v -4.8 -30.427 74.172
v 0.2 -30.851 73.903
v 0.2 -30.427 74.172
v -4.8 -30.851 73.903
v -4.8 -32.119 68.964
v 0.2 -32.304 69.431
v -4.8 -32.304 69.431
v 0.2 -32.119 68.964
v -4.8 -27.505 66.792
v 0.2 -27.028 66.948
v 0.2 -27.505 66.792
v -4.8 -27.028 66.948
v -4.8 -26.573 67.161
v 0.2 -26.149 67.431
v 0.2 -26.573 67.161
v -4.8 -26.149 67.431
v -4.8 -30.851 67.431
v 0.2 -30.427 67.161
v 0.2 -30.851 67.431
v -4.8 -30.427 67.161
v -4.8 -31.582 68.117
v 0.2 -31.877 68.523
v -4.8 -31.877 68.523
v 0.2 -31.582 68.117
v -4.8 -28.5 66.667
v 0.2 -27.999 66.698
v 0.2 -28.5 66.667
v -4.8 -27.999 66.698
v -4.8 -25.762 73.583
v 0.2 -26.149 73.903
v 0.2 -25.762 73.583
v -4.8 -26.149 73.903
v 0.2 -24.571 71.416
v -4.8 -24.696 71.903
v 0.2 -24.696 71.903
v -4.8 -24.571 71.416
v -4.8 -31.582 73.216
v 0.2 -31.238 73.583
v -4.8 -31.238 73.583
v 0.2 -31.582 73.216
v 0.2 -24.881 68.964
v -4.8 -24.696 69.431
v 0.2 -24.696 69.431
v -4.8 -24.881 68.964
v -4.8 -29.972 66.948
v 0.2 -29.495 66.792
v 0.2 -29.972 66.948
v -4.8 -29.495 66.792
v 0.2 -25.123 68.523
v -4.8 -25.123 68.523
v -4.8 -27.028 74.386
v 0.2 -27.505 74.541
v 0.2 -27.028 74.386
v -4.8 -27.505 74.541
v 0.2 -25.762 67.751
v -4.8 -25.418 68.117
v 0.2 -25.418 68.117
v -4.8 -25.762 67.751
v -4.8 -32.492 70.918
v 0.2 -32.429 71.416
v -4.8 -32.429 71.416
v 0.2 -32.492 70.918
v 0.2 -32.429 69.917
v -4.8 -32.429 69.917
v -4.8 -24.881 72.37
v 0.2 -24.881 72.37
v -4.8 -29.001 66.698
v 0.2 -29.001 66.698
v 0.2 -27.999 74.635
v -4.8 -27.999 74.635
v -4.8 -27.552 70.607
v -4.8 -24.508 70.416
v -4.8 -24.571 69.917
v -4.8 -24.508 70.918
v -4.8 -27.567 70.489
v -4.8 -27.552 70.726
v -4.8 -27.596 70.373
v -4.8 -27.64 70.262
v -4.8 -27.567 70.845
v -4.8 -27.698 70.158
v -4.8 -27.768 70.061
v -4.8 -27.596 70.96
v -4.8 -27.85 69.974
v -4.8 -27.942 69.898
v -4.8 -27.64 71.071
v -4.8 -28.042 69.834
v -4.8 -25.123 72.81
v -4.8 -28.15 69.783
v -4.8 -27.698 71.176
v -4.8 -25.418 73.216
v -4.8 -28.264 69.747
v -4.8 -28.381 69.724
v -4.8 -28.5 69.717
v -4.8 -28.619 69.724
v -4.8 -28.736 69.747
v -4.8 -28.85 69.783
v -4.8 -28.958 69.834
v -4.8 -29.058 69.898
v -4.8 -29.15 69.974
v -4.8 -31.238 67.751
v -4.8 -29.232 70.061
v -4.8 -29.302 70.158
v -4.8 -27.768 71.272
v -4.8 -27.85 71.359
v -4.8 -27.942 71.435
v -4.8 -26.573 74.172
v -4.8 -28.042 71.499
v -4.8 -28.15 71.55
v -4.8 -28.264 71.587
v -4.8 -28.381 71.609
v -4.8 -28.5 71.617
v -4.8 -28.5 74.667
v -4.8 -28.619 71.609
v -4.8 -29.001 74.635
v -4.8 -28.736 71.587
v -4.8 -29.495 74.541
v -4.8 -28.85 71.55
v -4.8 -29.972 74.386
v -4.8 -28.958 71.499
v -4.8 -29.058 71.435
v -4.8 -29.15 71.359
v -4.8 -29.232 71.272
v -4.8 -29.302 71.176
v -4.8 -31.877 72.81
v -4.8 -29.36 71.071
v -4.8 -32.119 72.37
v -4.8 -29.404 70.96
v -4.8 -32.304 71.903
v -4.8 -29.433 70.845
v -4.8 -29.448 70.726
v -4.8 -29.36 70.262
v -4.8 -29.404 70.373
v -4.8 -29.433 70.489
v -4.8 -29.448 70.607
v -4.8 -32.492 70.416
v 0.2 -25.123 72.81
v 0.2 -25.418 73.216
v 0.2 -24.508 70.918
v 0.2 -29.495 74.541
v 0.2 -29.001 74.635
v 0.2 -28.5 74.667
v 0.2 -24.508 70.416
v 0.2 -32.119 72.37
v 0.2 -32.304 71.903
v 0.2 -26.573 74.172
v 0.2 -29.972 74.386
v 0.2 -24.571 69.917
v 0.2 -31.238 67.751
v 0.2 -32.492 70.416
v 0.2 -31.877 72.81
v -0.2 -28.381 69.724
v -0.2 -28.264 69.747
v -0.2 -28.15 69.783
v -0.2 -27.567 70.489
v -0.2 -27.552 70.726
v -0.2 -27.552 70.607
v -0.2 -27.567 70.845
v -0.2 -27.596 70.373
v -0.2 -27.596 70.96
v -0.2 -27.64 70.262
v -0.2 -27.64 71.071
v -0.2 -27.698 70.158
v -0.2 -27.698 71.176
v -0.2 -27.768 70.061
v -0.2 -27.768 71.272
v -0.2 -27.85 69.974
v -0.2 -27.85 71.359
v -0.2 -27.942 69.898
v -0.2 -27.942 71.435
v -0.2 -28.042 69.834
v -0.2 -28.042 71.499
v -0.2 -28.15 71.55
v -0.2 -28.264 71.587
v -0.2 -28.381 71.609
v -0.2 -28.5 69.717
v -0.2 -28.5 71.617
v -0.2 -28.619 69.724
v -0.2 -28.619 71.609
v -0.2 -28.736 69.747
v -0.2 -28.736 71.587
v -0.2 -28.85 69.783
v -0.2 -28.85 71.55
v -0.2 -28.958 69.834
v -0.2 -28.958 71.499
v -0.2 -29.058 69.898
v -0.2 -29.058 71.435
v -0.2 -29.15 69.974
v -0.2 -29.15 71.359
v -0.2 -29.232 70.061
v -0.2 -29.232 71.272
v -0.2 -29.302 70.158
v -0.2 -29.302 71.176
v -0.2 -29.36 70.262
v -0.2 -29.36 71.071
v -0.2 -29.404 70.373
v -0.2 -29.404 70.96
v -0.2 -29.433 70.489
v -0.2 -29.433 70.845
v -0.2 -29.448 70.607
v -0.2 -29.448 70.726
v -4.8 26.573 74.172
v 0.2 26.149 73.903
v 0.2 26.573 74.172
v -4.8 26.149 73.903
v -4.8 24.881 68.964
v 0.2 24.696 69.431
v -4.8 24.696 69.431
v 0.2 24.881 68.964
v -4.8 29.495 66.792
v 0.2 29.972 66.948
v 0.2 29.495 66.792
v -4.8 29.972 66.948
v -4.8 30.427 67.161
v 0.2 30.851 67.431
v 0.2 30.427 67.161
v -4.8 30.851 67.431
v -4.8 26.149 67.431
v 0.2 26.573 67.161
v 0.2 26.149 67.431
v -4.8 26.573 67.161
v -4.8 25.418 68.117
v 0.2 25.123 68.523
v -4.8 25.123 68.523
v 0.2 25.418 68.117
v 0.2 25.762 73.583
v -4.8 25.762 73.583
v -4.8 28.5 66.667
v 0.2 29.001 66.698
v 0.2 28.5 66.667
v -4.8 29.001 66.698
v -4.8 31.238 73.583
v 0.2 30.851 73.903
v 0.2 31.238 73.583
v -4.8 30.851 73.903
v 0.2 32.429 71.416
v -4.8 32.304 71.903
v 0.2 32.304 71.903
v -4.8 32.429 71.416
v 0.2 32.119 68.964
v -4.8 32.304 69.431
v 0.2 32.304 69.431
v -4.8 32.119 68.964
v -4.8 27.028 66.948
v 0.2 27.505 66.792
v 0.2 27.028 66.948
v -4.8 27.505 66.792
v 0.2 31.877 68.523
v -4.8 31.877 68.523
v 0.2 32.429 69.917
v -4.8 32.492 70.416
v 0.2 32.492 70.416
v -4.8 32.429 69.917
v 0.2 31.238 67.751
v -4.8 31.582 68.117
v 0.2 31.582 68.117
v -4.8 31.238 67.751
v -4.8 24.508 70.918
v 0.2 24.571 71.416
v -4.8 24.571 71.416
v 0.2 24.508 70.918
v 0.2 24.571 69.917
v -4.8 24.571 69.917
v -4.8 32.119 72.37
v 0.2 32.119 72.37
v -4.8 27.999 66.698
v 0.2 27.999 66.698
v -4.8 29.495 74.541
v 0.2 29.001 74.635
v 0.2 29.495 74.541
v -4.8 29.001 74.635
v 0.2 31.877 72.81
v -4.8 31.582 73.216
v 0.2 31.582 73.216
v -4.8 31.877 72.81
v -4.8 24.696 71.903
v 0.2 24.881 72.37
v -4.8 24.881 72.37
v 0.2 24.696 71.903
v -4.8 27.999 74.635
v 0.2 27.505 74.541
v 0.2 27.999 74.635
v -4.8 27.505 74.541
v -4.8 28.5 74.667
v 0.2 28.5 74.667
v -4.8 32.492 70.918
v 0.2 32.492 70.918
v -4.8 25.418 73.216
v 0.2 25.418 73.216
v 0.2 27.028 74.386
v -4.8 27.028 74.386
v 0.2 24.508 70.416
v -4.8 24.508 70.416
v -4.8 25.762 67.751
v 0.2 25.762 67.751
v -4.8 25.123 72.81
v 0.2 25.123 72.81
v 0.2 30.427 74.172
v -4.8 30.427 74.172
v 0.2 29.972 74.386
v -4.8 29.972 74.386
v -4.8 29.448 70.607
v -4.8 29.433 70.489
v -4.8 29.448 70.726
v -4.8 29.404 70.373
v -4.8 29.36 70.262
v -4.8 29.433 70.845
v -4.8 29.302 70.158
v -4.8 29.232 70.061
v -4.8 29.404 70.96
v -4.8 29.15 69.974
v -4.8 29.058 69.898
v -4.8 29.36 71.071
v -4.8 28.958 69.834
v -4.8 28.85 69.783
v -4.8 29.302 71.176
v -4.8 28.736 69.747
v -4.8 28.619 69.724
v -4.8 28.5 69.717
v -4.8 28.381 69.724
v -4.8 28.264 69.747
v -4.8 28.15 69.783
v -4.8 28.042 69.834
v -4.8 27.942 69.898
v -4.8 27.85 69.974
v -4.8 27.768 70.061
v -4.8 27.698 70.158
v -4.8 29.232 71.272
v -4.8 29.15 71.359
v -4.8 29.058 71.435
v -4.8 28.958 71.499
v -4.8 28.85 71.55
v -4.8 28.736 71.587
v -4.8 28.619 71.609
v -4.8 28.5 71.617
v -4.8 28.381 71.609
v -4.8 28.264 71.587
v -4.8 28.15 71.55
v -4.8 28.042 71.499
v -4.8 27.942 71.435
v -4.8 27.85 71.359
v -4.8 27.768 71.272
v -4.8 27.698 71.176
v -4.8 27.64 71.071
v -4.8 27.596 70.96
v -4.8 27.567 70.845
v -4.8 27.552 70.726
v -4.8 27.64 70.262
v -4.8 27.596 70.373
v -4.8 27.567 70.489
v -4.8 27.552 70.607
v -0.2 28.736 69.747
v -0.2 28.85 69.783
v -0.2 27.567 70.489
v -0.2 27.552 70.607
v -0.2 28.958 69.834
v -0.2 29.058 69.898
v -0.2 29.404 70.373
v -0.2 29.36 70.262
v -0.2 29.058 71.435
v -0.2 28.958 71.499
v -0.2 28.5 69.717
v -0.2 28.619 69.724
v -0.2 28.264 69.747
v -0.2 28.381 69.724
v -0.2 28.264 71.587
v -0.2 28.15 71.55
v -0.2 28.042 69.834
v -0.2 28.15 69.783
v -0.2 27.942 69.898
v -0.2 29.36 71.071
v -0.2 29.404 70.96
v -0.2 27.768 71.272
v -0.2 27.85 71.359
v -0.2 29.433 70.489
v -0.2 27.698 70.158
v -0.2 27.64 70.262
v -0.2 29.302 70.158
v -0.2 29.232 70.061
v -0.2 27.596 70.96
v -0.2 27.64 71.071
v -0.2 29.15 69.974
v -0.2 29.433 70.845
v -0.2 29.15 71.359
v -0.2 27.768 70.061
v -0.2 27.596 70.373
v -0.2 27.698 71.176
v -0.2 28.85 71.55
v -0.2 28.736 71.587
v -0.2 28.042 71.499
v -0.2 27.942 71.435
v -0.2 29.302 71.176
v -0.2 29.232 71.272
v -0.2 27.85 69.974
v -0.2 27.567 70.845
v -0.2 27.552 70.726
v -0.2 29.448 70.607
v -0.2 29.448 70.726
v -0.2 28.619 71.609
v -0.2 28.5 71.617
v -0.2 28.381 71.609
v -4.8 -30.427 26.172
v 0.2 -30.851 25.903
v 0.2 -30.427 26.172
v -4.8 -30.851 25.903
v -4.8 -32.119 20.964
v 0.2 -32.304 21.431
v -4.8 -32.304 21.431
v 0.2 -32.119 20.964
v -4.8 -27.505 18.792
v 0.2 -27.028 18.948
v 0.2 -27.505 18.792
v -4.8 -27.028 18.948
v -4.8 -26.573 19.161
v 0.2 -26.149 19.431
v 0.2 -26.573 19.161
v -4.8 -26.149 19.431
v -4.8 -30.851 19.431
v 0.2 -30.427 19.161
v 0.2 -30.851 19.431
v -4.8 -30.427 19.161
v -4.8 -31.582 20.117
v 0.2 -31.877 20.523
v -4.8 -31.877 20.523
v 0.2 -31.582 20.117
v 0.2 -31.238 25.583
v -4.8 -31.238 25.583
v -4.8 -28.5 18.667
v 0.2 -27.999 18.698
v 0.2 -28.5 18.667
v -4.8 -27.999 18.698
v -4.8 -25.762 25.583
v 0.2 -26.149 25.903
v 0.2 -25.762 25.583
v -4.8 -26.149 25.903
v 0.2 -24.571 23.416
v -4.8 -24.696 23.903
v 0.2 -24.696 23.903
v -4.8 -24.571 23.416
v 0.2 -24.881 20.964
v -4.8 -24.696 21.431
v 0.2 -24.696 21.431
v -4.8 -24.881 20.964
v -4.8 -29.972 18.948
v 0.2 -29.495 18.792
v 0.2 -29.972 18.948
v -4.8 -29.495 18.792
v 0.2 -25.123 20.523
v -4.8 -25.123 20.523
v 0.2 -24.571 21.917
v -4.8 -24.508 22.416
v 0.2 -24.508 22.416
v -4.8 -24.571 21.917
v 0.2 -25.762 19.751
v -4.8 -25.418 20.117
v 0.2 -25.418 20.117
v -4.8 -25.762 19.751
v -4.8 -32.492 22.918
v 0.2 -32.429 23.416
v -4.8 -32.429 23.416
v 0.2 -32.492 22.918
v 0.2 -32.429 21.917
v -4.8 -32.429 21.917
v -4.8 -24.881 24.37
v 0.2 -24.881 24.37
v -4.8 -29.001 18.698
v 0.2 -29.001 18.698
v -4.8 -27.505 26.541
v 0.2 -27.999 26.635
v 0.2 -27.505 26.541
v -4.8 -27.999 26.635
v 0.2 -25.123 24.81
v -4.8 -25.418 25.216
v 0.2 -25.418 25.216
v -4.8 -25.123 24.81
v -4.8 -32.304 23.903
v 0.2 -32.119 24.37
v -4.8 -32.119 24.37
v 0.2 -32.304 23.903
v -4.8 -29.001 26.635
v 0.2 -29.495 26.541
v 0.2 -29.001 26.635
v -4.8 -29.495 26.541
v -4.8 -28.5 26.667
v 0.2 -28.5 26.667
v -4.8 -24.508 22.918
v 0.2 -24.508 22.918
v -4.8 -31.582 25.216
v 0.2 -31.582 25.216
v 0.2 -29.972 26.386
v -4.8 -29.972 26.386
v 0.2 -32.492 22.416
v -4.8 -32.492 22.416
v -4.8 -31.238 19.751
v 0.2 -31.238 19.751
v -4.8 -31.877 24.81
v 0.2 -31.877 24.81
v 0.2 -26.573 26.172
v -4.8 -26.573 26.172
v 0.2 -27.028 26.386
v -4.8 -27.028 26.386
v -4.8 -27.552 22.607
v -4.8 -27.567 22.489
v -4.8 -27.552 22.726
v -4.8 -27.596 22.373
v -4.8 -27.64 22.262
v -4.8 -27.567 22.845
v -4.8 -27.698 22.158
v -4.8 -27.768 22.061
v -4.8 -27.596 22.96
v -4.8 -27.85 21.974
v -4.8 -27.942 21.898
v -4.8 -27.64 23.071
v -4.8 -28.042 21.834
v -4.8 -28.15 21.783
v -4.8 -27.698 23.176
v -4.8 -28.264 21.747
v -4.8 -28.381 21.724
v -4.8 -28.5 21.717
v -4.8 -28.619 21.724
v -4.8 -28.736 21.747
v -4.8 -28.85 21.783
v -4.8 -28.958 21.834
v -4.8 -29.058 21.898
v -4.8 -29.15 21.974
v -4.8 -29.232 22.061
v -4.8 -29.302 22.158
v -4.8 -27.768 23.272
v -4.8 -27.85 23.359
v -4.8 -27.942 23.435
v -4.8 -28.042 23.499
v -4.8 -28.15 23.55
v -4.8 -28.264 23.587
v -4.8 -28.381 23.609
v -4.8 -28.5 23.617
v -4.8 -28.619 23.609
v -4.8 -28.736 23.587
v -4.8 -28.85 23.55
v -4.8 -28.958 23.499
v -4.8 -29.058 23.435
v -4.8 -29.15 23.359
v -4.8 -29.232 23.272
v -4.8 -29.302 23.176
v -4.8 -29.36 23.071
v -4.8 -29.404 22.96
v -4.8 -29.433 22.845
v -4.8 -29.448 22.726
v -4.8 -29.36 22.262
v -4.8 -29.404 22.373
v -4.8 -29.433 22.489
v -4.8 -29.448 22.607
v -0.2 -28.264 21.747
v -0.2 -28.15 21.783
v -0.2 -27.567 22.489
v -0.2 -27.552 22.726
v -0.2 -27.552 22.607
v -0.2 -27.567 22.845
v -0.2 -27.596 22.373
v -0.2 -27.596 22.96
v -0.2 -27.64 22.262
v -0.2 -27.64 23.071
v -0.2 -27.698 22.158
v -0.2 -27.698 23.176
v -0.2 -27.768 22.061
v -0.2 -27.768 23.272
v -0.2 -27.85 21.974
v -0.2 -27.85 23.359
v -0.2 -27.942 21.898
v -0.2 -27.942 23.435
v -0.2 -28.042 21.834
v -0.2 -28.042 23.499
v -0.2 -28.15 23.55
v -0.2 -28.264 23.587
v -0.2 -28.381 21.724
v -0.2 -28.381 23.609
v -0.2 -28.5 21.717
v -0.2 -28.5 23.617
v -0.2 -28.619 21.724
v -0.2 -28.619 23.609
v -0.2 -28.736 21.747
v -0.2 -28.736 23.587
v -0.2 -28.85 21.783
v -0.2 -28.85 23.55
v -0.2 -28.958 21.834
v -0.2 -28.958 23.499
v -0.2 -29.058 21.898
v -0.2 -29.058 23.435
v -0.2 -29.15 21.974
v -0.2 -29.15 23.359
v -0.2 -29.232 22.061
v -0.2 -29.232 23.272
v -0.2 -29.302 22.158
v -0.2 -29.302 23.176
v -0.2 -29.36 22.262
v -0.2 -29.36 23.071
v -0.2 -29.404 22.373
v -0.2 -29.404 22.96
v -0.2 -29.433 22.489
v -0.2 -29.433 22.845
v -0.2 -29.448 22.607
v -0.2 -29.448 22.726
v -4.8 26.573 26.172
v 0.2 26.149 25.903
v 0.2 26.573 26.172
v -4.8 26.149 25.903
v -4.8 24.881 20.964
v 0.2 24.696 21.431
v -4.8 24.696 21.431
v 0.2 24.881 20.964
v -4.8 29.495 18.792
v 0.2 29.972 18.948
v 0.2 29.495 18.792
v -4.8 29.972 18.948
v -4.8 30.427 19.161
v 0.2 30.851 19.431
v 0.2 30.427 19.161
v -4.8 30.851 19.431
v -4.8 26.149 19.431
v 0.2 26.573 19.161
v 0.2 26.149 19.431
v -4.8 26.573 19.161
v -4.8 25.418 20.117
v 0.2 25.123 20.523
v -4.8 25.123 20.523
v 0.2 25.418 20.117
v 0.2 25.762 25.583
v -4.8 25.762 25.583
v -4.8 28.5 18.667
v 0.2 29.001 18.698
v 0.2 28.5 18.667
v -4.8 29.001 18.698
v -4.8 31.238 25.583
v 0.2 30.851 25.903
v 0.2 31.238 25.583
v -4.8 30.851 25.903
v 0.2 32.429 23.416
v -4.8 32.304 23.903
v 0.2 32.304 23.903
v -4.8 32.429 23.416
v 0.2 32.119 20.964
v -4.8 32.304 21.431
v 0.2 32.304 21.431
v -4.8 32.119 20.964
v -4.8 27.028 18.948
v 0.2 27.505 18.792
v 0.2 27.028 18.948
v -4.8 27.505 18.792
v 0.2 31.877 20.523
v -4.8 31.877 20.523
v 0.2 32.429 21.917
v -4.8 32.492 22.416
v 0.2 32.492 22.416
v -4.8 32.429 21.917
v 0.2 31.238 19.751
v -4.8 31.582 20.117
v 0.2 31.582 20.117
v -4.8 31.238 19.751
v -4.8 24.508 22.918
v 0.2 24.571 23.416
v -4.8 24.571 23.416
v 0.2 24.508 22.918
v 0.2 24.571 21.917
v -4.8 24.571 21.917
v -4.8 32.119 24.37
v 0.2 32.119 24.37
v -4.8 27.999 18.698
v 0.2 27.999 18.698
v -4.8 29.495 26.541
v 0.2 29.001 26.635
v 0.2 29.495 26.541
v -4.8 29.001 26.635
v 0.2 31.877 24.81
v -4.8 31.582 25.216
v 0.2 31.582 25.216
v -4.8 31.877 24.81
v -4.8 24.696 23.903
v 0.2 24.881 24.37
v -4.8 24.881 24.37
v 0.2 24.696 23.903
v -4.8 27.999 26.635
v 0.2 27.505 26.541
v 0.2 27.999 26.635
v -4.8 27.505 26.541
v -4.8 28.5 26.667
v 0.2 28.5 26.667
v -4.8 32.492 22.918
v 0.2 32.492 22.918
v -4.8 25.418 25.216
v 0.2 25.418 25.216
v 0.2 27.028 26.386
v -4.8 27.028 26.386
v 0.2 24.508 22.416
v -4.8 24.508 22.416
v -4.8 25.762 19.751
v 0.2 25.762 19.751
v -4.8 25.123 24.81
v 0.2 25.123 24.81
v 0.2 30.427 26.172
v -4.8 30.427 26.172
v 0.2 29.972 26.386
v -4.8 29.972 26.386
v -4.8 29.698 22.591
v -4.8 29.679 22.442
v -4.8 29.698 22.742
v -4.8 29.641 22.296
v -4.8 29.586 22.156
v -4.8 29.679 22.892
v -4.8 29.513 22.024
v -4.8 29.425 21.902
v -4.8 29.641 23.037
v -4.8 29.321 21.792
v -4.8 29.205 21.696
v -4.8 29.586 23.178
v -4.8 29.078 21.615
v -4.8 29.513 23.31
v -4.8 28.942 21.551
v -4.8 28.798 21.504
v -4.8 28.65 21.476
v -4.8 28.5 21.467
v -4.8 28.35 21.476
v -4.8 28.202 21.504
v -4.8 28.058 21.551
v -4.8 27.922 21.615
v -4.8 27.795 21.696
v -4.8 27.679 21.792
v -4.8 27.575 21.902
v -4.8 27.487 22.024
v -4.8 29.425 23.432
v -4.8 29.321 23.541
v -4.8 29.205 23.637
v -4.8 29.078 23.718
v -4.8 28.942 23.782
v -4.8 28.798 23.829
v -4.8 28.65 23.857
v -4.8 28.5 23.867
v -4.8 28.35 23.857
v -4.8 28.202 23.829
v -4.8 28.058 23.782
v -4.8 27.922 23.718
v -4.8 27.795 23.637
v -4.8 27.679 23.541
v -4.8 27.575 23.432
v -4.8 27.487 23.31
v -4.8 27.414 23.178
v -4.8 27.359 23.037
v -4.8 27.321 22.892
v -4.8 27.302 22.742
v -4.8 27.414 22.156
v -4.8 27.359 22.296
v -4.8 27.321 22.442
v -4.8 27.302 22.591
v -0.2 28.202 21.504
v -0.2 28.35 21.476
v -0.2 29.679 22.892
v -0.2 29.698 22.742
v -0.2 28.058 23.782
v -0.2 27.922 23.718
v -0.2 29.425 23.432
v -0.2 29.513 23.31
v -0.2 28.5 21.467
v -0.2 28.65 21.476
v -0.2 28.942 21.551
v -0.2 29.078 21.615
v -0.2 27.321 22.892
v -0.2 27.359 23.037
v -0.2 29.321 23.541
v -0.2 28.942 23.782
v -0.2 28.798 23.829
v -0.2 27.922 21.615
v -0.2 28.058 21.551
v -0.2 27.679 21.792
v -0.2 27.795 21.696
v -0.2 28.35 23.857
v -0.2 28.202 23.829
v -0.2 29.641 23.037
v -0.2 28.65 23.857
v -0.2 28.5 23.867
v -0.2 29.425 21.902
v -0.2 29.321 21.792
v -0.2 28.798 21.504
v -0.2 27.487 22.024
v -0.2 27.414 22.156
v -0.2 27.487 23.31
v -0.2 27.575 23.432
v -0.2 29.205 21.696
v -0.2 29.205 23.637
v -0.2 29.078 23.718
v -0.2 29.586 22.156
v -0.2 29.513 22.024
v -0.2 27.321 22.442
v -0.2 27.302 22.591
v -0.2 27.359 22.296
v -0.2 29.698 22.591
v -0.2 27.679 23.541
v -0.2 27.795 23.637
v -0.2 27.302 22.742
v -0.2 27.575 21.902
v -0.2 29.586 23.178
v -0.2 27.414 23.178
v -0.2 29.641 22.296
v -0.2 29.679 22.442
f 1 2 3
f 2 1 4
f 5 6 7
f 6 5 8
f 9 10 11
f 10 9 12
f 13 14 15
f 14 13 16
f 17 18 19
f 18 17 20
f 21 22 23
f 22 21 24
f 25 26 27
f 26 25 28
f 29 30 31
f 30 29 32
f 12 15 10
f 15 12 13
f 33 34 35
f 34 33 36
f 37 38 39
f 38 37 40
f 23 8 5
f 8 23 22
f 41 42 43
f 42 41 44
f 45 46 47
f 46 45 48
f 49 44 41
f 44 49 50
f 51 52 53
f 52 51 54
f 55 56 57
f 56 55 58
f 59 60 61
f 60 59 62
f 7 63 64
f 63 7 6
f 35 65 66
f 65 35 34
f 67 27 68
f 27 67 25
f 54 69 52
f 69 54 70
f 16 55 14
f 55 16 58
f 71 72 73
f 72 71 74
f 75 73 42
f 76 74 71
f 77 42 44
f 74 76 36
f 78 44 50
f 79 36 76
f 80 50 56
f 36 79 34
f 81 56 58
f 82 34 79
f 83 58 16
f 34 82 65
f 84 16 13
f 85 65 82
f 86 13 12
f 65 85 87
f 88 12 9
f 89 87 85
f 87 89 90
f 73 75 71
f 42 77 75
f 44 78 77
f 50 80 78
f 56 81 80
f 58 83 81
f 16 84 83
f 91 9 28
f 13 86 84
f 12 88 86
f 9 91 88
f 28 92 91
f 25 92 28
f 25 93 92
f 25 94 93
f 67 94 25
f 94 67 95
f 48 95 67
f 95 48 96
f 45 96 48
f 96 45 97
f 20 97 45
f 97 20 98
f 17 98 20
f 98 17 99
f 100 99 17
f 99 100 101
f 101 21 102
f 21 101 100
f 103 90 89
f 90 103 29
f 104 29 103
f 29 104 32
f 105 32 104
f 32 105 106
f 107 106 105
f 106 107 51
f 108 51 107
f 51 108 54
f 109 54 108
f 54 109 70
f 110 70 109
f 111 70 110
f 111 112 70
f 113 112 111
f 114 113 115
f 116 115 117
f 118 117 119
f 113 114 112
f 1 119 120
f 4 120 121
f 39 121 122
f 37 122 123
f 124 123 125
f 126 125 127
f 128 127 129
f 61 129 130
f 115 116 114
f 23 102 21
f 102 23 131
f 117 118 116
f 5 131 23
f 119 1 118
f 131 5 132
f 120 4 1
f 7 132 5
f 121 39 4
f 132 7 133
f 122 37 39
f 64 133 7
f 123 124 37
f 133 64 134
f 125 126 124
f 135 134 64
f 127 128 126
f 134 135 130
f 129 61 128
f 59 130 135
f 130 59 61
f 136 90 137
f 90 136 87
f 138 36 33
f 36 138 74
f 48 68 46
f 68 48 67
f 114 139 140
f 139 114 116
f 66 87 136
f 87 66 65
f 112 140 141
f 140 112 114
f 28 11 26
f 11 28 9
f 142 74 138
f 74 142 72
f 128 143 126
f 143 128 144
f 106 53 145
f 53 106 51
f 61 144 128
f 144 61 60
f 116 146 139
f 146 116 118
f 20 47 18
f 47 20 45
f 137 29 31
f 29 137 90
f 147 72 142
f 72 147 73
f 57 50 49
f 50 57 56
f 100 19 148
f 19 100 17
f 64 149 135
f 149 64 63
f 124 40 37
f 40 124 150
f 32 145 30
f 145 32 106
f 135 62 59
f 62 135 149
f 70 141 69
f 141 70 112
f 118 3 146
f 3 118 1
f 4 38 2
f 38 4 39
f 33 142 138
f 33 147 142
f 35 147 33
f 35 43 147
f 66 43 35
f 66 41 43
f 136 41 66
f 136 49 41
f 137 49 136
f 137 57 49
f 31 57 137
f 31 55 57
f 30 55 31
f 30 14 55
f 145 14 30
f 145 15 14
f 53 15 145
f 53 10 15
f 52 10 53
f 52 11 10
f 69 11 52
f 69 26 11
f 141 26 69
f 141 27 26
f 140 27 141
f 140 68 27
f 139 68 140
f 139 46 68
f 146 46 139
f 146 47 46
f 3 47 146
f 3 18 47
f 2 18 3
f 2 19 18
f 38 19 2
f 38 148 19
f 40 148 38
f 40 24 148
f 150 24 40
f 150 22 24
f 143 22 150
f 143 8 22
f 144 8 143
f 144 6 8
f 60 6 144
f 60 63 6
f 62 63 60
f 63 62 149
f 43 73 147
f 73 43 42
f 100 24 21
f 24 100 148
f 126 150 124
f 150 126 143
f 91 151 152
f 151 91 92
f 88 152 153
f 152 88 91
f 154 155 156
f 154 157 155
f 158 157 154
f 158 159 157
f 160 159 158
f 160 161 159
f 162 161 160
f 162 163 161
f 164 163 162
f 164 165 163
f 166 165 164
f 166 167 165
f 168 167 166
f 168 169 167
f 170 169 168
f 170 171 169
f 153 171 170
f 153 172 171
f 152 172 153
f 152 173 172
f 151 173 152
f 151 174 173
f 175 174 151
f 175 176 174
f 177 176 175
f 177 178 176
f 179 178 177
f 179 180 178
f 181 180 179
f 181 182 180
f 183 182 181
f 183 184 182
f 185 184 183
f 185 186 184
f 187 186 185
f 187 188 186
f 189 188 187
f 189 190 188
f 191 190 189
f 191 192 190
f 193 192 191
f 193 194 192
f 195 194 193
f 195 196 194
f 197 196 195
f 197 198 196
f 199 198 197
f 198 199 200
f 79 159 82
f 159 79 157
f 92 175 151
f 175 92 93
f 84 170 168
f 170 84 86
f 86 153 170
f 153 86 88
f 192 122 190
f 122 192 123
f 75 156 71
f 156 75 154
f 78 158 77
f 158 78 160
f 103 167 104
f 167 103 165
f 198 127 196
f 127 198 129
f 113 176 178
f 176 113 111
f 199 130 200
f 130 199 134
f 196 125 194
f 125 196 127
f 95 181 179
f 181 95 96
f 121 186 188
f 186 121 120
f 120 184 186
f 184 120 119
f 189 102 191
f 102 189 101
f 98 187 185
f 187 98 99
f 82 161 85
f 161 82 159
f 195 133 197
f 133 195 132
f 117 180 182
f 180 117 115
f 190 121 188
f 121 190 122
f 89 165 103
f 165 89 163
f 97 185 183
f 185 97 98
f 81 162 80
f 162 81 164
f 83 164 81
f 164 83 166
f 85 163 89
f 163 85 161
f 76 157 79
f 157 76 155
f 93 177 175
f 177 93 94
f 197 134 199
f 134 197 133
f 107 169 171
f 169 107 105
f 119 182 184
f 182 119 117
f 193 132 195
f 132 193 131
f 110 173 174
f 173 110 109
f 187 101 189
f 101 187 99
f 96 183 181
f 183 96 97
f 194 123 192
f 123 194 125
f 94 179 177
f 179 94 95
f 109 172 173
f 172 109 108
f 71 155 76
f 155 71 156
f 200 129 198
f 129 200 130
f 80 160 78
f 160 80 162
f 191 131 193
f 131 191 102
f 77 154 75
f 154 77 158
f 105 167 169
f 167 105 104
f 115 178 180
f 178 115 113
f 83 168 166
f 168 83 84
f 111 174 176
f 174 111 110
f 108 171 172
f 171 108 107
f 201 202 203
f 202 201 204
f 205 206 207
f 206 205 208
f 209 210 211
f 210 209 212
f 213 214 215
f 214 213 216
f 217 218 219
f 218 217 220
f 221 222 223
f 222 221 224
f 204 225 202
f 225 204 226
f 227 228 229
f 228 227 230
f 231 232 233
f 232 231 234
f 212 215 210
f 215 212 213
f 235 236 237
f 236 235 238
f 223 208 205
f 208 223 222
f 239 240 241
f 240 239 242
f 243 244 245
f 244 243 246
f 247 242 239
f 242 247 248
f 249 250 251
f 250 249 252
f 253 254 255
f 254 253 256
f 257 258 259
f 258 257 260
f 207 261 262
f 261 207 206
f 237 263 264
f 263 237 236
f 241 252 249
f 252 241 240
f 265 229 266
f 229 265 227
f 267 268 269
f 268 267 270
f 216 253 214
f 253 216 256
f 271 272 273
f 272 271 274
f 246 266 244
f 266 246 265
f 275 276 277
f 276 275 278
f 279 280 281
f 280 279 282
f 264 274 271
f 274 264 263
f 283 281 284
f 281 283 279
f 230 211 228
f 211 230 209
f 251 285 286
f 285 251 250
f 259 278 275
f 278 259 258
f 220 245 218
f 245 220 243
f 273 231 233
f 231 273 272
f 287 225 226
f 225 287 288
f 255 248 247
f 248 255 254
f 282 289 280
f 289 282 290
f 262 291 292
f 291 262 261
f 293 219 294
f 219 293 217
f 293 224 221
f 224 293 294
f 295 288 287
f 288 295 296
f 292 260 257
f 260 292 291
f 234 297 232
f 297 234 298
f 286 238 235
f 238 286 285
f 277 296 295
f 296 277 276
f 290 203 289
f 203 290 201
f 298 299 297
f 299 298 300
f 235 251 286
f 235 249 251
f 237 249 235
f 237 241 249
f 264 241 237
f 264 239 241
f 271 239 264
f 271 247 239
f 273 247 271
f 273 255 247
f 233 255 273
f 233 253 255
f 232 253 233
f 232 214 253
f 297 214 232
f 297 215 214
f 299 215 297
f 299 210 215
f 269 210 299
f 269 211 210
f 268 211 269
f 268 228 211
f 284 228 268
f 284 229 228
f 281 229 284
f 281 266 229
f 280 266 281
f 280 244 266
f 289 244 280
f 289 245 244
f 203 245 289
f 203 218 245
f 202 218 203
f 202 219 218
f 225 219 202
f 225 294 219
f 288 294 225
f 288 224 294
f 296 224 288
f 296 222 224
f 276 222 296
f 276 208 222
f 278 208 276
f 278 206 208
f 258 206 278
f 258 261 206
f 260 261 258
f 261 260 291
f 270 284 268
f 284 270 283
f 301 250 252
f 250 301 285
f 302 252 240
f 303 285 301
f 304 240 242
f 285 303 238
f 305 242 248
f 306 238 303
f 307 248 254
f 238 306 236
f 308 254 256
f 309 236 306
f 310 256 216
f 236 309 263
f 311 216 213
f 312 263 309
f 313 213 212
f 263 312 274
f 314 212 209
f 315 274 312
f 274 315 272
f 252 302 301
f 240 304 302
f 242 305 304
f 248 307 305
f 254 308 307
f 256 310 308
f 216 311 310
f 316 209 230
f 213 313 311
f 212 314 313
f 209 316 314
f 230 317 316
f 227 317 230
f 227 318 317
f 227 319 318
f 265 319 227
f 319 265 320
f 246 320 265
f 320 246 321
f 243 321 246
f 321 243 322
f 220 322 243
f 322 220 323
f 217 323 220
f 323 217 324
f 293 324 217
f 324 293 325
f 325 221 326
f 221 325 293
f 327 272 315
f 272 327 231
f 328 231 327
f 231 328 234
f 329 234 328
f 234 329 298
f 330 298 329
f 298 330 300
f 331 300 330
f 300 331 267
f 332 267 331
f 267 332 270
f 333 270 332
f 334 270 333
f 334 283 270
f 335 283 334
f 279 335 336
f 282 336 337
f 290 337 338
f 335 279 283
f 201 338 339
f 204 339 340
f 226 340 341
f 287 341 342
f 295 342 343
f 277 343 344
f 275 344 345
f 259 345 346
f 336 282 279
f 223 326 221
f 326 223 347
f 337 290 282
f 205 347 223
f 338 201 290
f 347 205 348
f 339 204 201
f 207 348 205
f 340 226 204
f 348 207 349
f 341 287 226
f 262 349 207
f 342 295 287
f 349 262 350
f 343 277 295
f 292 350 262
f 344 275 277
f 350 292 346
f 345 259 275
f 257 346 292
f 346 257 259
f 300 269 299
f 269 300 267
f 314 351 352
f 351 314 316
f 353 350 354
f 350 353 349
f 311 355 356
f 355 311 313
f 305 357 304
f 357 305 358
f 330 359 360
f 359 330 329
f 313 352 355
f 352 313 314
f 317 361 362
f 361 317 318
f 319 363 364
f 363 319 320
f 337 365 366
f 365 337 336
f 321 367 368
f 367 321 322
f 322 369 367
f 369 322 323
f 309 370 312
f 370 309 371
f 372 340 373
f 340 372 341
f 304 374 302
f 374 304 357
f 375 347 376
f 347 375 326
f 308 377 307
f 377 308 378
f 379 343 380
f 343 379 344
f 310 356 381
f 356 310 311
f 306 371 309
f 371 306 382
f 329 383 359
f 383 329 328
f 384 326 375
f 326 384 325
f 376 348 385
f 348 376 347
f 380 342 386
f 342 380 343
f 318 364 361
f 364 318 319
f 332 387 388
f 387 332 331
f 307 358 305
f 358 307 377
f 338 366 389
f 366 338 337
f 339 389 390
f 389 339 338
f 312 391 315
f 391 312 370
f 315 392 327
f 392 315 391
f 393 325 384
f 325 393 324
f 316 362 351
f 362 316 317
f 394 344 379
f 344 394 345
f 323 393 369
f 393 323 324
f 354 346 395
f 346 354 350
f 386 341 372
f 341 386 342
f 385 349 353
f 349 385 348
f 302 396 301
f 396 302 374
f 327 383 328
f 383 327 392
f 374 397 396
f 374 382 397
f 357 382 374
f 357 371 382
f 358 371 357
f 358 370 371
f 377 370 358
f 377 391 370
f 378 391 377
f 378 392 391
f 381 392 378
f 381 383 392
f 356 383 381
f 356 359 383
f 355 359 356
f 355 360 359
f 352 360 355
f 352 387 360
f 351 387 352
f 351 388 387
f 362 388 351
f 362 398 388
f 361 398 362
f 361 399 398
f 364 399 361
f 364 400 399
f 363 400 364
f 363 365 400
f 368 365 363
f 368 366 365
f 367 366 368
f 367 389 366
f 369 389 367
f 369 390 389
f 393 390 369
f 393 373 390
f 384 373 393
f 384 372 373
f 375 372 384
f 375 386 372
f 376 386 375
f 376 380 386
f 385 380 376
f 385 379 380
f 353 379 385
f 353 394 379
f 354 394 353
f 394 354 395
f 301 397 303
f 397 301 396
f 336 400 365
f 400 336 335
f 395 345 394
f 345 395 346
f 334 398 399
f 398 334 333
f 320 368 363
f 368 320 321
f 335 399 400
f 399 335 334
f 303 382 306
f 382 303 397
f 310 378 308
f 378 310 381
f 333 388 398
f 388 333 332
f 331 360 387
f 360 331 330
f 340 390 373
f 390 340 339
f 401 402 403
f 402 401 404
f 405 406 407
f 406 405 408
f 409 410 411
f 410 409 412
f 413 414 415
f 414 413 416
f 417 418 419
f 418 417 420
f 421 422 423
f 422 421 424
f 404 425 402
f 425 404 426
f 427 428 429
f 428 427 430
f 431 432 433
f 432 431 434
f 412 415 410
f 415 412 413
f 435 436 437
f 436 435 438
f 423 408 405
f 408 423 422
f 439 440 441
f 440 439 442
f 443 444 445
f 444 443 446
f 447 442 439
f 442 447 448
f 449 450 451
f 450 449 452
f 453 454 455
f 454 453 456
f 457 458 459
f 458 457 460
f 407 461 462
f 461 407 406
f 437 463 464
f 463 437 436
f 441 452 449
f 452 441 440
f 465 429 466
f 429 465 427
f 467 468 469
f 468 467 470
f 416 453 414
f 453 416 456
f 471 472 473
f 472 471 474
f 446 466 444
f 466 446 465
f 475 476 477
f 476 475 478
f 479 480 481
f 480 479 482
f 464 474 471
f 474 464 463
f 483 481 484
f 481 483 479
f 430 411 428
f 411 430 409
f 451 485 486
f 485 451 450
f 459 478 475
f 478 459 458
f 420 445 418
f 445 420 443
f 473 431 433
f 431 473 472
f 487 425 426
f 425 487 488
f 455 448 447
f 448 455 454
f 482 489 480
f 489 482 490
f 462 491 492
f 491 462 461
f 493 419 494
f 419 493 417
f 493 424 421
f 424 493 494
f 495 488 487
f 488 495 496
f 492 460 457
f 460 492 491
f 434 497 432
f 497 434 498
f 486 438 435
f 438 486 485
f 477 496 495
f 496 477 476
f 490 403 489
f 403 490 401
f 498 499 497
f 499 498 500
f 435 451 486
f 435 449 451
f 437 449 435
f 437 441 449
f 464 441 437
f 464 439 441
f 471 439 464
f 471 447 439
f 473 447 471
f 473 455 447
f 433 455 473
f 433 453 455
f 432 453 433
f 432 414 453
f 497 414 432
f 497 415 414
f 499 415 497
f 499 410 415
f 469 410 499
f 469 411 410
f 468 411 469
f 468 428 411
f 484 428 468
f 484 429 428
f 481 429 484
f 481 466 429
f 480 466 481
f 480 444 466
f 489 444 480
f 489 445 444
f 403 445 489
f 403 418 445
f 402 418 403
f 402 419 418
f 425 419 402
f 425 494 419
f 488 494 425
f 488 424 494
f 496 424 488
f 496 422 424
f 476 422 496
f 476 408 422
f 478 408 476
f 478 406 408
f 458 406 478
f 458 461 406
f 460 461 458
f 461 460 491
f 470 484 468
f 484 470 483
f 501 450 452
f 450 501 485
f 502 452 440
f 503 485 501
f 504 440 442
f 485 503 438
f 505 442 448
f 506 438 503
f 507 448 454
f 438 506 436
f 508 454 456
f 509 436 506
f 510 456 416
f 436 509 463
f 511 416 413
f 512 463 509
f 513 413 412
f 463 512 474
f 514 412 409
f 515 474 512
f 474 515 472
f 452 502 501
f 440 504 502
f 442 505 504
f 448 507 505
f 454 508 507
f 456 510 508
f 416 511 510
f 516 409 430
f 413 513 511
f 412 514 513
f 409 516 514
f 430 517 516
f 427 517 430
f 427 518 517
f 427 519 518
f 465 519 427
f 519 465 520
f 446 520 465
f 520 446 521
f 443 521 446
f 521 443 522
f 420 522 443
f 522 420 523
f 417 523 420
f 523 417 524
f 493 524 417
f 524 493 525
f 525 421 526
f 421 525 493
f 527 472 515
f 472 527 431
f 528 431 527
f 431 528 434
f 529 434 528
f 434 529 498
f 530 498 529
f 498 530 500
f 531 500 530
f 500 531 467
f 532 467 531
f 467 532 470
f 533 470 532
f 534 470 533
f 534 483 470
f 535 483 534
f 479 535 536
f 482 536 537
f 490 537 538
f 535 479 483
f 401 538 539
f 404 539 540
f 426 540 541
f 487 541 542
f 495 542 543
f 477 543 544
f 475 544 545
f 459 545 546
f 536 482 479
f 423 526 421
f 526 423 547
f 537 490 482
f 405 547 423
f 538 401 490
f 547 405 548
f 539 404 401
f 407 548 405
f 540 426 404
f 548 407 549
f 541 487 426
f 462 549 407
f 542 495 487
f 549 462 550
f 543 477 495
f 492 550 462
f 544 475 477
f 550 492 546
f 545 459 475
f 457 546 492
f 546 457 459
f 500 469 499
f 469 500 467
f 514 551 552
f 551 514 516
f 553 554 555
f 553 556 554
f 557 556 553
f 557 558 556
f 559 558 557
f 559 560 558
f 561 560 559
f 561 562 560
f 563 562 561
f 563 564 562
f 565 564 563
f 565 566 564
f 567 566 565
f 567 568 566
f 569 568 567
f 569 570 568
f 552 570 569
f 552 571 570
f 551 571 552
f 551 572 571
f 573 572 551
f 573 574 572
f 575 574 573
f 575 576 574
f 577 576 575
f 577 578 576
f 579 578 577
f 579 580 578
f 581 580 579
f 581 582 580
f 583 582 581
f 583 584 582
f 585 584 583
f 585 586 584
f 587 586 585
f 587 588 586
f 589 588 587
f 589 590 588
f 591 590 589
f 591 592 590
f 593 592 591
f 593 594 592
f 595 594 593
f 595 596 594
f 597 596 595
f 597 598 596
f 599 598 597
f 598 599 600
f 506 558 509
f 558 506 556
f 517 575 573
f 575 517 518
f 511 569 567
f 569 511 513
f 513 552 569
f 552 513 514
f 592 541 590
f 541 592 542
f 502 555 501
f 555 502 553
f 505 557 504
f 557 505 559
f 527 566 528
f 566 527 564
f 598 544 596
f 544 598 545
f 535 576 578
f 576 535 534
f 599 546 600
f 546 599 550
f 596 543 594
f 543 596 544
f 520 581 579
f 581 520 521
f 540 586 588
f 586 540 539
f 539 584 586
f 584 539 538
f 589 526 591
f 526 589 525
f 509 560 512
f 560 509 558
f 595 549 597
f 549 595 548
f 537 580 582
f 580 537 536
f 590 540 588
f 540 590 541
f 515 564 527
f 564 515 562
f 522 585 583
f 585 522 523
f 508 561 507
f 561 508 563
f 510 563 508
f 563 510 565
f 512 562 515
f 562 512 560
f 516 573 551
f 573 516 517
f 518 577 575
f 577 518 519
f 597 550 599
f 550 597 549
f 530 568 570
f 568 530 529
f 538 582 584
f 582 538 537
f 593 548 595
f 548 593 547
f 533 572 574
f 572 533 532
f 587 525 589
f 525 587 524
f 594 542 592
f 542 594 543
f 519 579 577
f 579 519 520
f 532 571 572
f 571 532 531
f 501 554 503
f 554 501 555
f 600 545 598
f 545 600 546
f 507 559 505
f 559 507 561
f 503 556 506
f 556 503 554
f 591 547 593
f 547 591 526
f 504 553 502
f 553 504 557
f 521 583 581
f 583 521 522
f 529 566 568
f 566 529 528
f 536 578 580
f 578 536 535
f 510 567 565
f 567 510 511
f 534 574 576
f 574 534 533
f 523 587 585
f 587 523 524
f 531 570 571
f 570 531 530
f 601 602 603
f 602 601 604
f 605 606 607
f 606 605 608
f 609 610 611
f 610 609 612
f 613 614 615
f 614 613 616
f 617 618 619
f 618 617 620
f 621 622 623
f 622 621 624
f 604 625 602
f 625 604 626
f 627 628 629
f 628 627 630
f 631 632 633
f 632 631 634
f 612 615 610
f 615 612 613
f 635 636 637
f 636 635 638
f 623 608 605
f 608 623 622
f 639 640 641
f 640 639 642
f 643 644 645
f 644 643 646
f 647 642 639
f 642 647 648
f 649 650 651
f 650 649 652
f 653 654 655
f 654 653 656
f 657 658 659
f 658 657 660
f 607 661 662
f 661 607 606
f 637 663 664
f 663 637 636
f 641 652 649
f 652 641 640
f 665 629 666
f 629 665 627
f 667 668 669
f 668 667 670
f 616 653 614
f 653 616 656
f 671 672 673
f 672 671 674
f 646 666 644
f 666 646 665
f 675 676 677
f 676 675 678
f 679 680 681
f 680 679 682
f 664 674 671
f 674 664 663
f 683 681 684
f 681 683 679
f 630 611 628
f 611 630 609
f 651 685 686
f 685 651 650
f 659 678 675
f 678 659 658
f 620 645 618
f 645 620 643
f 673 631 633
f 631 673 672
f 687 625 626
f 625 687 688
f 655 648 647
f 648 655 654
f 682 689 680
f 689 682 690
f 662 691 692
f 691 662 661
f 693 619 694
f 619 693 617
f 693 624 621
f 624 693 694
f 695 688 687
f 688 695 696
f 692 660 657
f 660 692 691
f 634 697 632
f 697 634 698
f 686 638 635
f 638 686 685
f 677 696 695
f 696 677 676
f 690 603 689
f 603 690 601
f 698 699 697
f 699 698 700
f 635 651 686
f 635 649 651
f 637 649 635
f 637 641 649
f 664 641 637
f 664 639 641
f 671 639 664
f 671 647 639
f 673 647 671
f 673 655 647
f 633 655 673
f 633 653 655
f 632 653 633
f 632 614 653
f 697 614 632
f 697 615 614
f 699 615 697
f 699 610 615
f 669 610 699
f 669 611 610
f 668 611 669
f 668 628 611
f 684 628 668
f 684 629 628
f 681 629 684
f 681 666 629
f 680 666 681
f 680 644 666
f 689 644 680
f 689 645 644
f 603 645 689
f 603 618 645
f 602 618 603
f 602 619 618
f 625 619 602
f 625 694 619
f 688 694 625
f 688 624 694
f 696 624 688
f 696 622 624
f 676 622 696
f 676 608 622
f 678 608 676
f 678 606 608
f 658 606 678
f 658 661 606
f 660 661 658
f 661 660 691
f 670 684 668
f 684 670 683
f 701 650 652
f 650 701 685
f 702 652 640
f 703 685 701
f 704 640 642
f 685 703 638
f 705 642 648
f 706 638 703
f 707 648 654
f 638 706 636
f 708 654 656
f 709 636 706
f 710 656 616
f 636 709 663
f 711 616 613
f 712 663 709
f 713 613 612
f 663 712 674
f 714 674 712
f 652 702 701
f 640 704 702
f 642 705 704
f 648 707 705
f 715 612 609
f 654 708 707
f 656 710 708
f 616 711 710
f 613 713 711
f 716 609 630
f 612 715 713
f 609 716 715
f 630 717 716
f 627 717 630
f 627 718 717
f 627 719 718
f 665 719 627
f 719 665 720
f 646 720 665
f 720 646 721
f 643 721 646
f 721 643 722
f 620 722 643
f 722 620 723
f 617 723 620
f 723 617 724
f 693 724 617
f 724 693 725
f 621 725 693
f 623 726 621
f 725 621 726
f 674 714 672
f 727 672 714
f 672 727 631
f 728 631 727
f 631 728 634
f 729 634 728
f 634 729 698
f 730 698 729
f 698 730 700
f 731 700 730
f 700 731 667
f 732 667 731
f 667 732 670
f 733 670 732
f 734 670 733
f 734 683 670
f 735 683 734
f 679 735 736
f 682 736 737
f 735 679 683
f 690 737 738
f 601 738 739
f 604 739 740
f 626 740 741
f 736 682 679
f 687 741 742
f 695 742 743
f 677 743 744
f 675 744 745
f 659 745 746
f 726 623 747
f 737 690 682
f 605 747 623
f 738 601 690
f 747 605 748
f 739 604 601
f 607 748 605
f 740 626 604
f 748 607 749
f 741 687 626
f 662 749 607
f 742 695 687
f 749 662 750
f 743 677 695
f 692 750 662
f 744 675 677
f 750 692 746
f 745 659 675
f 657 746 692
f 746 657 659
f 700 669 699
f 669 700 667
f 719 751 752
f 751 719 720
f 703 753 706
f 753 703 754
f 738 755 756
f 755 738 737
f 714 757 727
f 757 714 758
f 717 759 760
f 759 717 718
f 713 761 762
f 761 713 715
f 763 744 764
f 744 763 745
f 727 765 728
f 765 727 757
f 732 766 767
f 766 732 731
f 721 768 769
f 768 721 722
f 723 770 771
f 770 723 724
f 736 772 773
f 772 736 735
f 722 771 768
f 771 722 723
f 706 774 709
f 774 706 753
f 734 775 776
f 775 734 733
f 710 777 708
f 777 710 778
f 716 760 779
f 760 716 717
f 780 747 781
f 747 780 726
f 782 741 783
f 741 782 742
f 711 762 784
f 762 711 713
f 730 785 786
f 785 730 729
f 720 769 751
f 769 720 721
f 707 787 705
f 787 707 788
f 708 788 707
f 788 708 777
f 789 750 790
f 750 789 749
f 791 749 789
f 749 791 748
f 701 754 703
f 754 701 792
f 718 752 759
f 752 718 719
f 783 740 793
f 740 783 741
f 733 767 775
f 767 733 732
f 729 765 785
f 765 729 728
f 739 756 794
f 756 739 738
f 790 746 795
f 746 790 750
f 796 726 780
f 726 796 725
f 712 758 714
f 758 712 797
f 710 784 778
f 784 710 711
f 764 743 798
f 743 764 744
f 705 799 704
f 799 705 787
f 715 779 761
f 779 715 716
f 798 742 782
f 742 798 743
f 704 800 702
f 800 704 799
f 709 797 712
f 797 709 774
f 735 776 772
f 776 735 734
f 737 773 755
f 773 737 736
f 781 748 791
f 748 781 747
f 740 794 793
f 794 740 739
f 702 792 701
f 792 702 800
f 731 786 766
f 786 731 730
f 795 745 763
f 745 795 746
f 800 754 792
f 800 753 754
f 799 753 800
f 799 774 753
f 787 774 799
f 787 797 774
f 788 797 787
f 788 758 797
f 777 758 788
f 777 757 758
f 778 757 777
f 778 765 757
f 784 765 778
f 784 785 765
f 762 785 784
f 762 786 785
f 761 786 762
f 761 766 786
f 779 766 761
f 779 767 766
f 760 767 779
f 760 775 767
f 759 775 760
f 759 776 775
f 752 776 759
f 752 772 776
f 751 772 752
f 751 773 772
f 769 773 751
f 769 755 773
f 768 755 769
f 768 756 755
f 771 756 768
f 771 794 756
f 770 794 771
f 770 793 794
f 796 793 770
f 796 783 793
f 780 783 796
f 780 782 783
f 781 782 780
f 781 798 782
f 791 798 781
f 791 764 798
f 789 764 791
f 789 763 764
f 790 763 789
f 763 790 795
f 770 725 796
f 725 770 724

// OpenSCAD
// file: ../robot_settings.scad
main_box_x = 100; // 96
main_box_y = 102;
main_box_z = 74; // 74.5

lfp_main_box_x = 65;
lfp_main_box_y = 151;
lfp_main_box_z = 95;

wall_thickness = 2;

rail_gap = 2;
rail_inset = 7;

rail_thickness = 7;
rail_length = 250;
rail_width = 250;

raspberry_pi_screw_seperation_y = 57;
raspberry_pi_screw_seperation_z = 48;
raspberry_pi_peg_h = 5;

battery_box_peg_h = 6;
battery_box_peg_d = 8;
battery_box_peg_cutout = 5;

gears_module = 1;
pinion_gear_teeth = 32;
pinion_gear_width = 5;
pinion_gear_bore = 8;

gears_setback_distance = 25;
gear_post_height = 2 * pinion_gear_width + rail_thickness + 8 ;

steering_motor_mount_x = 45;
steering_motor_mount_y = 36;
steering_motor_mount_z = 18;
steering_motor_mount_setback_distance = gears_setback_distance + 16;

dc_motor_drivertype = "Teyleten"; // Teyleten
isAdafruit = (dc_motor_drivertype == "Adafruit");

drv8871_x = isAdafruit ? 20.3 : 21.6;
drv8871_y = isAdafruit ?  24 : 25;

drv8871_z = 2;
drv8871_screw_d = 2.5;
drv8871_solder_points_z = 2;

drv8871mount_edge_x = 1.5;
drv8871mount_edge_wall = 3;
drv8871mount_z = 5;
drv8871mount_x = drv8871_x +  drv8871mount_edge_wall - 2* drv8871mount_edge_x;
drv8871mount_y = 19;

drv8871_screw_distance = 15.64;
drv8871_solder_points_d = 1.66;
drv8871_solder_offset_y = 4.4;
drv8871_solder_inner_points_distance = 5;
drv8871_solder_outer_points_distance = 12;

dc_motor_75_1_housing_minus_encoder_z = 53.8;
dc_motor_75_1_encoder_z = 14.75;
dc_motor_housing_minus_encoder_z = 48;
dc_motor_encoder_z = 9.33;
dc_motor_encoder_wheel_d = 13.4;
dc_motor_encoder_wheel_thickness = 5;
dc_motor_encoder_wheel_gap = 3;
dc_motor_encoder_circuit_thickness = 2;
dc_motor_cutout_d = 24.8;
dc_motor_cutout_z = 19.5;


M3_shaft_d = 2.82;

dc_motor_screw_head_z = 2;
dc_motor_screw_head_d = 5.6;
dc_motor_screw_d = 3.2;
dc_motor_screw_offset = 8.5;

dc_motor_axle_ring_z = 3;
dc_motor_axle_ring_d = 7.2;
dc_motor_axle_cutout_d = 4.2;
dc_motor_axle_cutout_z = 10;
dc_motor_axle_notch_cutout = 0.4;
dc_motor_axle_notch_cutout_z = 6;

pdmount_x = 20;
pdmount_y = 30;
pdmount_z = 2;
pdmount_edge_x = 1.5;
pdmount_edge_wall = 3;

steering_shaft_z = 45;
steering_shaft_d = 7;
steering_shaft_motor_fitting_d = 9;
coupler_length = 24.6;
coupler_diameter = 14;
coupler_screw_d = 4;
coupler_screw_z_offset = 5;
coupler_gear_side_insert = 12.6;
steering_shaft_with_coupler_z = steering_shaft_z - coupler_gear_side_insert;

lidar_mount_y = 110;
lidar_mount_x = 65 + 20;
lidar_narrow_screws = 40;
lidar_wide_screws = 56;
lidar_front_to_back_screws = 70;
lidar_screw_d = 3;
lidar_circuitboard_x = 20;
lidar_circuitboard_y = 35;
lidar_circuitboard_z = 1.2;
lidar_cord_length = 29;

ball_bearing_height = 7;
ball_bearing_outer_diameter = 22;
ball_bearing_inner_diameter = 8;

M4_diameter = 5.1;
M3_diameter = 2.9;
M3_length = 35;
M3_cap_length= 3;
M3_cap_diameter = 5.44;

suspension_spring_outer_diameter = 8;
suspension_spring_inner_diameter = 5.3;

armature_holder_height = 20;
armature_holder_thickness = 8;
pull_bar_peg_r = 3.2;
apparatus_locking_peg_d = 4;

rack_module = 1;
rack_length = main_box_x;
rack_height = 5;
rack_width = 10;
rack_teeth = 30;
rack_bore = 3;

pull_bar_length = rail_width / 2 - rack_length + 1;

// tire hardware
axle_length = 24 + ball_bearing_height; 
axle_reciever_inner_diameter = 8.2;
axle_reciever_outer_diameter = 12;
axle_reciever_length = 18.8;
axle_notch_length = 15;
axle_notch_cutout = 2.4;

// power distribution bar
power_bar_cutout_x = 96;
power_bar_y = 19.1;
power_bar_z = 1.5;
power_bar_screw_distance = 91.4;
power_bar_screw_d = 2.8;
power_bar_standoff_z = 5;
power_bar_standoff_d = 6.83;

pico_expander_width = 63;
pico_expander_height = 57;
pico_screw_hole_offset = 3;
pico_screw_hole_d = 2.5;

usbhub_thickness = 11.7;
usbhub_depth = 37.5;
usbhub_width = 86.7;
usbhub_end_port_width = 14.8;
usbhub_end_port_height = 12;
usbhub_front_face_safe_zone_left = 15;
usbhub_front_face_safe_zone_right = 14.8;

switch_w = 16;
switch_cutout_d = 12.2;
switch_bump_h = 2;
switch_bump_l = 18.2;

i2c_mount_thickness = 3;
i2c_w = 28;
i2c_l = 28;
i2c_circuitboard_thickness = 1.23;
i2c_bottom_notch_w = 14.35;
i2c_bottom_notch_depth = 1;
i2c_screw_hole_d = 1.9;
i2c_screw_hole_offset = 1.4;
i2c_pin_l = 11;
i2c_pin_d = 0.8;
i2c_pin_offset = 1.5;
i2c_pin_separation = 2.5;
i2c_all_pins_l = 8.3;
i2c_screen_thickness = 1.88;
i2c_screen_w = 14.6;
i2c_screen_d = 27;
i2c_screen_offset = 4.1;
// main file
include <../robot_settings.scad>
$fn = 50;

module RP5() {

 difference() {
    translate([
              -raspberry_pi_peg_h + .2, 
              - raspberry_pi_screw_seperation_y / 2, 
              main_box_z / 2 - main_box_z /6 + main_box_z / 2 + 9])
    rotate([0,90,0])
    cylinder(h = raspberry_pi_peg_h, d = ball_bearing_inner_diameter);
    
    // screw hole
    translate([
              -raspberry_pi_peg_h - .2, 
              - raspberry_pi_screw_seperation_y / 2, 
              main_box_z / 2 - main_box_z /6 + main_box_z / 2 + 9])
    rotate([0,90,0])
    cylinder(h = raspberry_pi_peg_h, d = power_bar_screw_d / 2 +.5);
  }

  // rp5 mounting pegs - top left
  difference() {
    translate([
              -raspberry_pi_peg_h + .2,
              raspberry_pi_screw_seperation_y / 2, 
              main_box_z / 2 - main_box_z /6 + main_box_z / 2 + 9])
    rotate([0,90,0])
    cylinder(h = raspberry_pi_peg_h, d = ball_bearing_inner_diameter);

    // screw hole
    translate([
              -raspberry_pi_peg_h - .2,
              raspberry_pi_screw_seperation_y / 2, 
              main_box_z / 2 - main_box_z /6 + main_box_z / 2 + 9])
    rotate([0,90,0])
    cylinder(h = raspberry_pi_peg_h, d = power_bar_screw_d / 2 + .5);
  }

  // rp5 mounting pegs - bottom right
  // rp5 mounting pegs - top right
  difference() {
    translate([
              -raspberry_pi_peg_h + .2, 
              - raspberry_pi_screw_seperation_y / 2, 
              main_box_z / 2 - main_box_z /6 + main_box_z / 2 - raspberry_pi_screw_seperation_z + 9])
    rotate([0,90,0])
    cylinder(h = raspberry_pi_peg_h, d = ball_bearing_inner_diameter);
    
    // screw hole
    translate([
              - raspberry_pi_peg_h - .2, 
              - raspberry_pi_screw_seperation_y / 2, 
              main_box_z / 2 - main_box_z /6 + main_box_z / 2 - raspberry_pi_screw_seperation_z + 9])
    rotate([0,90,0])
  cylinder(h = raspberry_pi_peg_h, d = power_bar_screw_d / 2 + .5);  
  }

  // rp5 mounting pegs - bottom left
  difference() {
  translate([
            -raspberry_pi_peg_h + .2,
            raspberry_pi_screw_seperation_y / 2, 
            main_box_z / 2 - main_box_z /6 + main_box_z / 2 -raspberry_pi_screw_seperation_z + 9])
  rotate([0,90,0])
  cylinder(h = raspberry_pi_peg_h, d = ball_bearing_inner_diameter);

  translate([
            -raspberry_pi_peg_h - .2,
            raspberry_pi_screw_seperation_y / 2, 
            main_box_z / 2 - main_box_z /6 + main_box_z / 2 -raspberry_pi_screw_seperation_z + 9])
  rotate([0,90,0])
  cylinder(h = raspberry_pi_peg_h, d = power_bar_screw_d / 2 + 1);
  }
}
RP5();
  
